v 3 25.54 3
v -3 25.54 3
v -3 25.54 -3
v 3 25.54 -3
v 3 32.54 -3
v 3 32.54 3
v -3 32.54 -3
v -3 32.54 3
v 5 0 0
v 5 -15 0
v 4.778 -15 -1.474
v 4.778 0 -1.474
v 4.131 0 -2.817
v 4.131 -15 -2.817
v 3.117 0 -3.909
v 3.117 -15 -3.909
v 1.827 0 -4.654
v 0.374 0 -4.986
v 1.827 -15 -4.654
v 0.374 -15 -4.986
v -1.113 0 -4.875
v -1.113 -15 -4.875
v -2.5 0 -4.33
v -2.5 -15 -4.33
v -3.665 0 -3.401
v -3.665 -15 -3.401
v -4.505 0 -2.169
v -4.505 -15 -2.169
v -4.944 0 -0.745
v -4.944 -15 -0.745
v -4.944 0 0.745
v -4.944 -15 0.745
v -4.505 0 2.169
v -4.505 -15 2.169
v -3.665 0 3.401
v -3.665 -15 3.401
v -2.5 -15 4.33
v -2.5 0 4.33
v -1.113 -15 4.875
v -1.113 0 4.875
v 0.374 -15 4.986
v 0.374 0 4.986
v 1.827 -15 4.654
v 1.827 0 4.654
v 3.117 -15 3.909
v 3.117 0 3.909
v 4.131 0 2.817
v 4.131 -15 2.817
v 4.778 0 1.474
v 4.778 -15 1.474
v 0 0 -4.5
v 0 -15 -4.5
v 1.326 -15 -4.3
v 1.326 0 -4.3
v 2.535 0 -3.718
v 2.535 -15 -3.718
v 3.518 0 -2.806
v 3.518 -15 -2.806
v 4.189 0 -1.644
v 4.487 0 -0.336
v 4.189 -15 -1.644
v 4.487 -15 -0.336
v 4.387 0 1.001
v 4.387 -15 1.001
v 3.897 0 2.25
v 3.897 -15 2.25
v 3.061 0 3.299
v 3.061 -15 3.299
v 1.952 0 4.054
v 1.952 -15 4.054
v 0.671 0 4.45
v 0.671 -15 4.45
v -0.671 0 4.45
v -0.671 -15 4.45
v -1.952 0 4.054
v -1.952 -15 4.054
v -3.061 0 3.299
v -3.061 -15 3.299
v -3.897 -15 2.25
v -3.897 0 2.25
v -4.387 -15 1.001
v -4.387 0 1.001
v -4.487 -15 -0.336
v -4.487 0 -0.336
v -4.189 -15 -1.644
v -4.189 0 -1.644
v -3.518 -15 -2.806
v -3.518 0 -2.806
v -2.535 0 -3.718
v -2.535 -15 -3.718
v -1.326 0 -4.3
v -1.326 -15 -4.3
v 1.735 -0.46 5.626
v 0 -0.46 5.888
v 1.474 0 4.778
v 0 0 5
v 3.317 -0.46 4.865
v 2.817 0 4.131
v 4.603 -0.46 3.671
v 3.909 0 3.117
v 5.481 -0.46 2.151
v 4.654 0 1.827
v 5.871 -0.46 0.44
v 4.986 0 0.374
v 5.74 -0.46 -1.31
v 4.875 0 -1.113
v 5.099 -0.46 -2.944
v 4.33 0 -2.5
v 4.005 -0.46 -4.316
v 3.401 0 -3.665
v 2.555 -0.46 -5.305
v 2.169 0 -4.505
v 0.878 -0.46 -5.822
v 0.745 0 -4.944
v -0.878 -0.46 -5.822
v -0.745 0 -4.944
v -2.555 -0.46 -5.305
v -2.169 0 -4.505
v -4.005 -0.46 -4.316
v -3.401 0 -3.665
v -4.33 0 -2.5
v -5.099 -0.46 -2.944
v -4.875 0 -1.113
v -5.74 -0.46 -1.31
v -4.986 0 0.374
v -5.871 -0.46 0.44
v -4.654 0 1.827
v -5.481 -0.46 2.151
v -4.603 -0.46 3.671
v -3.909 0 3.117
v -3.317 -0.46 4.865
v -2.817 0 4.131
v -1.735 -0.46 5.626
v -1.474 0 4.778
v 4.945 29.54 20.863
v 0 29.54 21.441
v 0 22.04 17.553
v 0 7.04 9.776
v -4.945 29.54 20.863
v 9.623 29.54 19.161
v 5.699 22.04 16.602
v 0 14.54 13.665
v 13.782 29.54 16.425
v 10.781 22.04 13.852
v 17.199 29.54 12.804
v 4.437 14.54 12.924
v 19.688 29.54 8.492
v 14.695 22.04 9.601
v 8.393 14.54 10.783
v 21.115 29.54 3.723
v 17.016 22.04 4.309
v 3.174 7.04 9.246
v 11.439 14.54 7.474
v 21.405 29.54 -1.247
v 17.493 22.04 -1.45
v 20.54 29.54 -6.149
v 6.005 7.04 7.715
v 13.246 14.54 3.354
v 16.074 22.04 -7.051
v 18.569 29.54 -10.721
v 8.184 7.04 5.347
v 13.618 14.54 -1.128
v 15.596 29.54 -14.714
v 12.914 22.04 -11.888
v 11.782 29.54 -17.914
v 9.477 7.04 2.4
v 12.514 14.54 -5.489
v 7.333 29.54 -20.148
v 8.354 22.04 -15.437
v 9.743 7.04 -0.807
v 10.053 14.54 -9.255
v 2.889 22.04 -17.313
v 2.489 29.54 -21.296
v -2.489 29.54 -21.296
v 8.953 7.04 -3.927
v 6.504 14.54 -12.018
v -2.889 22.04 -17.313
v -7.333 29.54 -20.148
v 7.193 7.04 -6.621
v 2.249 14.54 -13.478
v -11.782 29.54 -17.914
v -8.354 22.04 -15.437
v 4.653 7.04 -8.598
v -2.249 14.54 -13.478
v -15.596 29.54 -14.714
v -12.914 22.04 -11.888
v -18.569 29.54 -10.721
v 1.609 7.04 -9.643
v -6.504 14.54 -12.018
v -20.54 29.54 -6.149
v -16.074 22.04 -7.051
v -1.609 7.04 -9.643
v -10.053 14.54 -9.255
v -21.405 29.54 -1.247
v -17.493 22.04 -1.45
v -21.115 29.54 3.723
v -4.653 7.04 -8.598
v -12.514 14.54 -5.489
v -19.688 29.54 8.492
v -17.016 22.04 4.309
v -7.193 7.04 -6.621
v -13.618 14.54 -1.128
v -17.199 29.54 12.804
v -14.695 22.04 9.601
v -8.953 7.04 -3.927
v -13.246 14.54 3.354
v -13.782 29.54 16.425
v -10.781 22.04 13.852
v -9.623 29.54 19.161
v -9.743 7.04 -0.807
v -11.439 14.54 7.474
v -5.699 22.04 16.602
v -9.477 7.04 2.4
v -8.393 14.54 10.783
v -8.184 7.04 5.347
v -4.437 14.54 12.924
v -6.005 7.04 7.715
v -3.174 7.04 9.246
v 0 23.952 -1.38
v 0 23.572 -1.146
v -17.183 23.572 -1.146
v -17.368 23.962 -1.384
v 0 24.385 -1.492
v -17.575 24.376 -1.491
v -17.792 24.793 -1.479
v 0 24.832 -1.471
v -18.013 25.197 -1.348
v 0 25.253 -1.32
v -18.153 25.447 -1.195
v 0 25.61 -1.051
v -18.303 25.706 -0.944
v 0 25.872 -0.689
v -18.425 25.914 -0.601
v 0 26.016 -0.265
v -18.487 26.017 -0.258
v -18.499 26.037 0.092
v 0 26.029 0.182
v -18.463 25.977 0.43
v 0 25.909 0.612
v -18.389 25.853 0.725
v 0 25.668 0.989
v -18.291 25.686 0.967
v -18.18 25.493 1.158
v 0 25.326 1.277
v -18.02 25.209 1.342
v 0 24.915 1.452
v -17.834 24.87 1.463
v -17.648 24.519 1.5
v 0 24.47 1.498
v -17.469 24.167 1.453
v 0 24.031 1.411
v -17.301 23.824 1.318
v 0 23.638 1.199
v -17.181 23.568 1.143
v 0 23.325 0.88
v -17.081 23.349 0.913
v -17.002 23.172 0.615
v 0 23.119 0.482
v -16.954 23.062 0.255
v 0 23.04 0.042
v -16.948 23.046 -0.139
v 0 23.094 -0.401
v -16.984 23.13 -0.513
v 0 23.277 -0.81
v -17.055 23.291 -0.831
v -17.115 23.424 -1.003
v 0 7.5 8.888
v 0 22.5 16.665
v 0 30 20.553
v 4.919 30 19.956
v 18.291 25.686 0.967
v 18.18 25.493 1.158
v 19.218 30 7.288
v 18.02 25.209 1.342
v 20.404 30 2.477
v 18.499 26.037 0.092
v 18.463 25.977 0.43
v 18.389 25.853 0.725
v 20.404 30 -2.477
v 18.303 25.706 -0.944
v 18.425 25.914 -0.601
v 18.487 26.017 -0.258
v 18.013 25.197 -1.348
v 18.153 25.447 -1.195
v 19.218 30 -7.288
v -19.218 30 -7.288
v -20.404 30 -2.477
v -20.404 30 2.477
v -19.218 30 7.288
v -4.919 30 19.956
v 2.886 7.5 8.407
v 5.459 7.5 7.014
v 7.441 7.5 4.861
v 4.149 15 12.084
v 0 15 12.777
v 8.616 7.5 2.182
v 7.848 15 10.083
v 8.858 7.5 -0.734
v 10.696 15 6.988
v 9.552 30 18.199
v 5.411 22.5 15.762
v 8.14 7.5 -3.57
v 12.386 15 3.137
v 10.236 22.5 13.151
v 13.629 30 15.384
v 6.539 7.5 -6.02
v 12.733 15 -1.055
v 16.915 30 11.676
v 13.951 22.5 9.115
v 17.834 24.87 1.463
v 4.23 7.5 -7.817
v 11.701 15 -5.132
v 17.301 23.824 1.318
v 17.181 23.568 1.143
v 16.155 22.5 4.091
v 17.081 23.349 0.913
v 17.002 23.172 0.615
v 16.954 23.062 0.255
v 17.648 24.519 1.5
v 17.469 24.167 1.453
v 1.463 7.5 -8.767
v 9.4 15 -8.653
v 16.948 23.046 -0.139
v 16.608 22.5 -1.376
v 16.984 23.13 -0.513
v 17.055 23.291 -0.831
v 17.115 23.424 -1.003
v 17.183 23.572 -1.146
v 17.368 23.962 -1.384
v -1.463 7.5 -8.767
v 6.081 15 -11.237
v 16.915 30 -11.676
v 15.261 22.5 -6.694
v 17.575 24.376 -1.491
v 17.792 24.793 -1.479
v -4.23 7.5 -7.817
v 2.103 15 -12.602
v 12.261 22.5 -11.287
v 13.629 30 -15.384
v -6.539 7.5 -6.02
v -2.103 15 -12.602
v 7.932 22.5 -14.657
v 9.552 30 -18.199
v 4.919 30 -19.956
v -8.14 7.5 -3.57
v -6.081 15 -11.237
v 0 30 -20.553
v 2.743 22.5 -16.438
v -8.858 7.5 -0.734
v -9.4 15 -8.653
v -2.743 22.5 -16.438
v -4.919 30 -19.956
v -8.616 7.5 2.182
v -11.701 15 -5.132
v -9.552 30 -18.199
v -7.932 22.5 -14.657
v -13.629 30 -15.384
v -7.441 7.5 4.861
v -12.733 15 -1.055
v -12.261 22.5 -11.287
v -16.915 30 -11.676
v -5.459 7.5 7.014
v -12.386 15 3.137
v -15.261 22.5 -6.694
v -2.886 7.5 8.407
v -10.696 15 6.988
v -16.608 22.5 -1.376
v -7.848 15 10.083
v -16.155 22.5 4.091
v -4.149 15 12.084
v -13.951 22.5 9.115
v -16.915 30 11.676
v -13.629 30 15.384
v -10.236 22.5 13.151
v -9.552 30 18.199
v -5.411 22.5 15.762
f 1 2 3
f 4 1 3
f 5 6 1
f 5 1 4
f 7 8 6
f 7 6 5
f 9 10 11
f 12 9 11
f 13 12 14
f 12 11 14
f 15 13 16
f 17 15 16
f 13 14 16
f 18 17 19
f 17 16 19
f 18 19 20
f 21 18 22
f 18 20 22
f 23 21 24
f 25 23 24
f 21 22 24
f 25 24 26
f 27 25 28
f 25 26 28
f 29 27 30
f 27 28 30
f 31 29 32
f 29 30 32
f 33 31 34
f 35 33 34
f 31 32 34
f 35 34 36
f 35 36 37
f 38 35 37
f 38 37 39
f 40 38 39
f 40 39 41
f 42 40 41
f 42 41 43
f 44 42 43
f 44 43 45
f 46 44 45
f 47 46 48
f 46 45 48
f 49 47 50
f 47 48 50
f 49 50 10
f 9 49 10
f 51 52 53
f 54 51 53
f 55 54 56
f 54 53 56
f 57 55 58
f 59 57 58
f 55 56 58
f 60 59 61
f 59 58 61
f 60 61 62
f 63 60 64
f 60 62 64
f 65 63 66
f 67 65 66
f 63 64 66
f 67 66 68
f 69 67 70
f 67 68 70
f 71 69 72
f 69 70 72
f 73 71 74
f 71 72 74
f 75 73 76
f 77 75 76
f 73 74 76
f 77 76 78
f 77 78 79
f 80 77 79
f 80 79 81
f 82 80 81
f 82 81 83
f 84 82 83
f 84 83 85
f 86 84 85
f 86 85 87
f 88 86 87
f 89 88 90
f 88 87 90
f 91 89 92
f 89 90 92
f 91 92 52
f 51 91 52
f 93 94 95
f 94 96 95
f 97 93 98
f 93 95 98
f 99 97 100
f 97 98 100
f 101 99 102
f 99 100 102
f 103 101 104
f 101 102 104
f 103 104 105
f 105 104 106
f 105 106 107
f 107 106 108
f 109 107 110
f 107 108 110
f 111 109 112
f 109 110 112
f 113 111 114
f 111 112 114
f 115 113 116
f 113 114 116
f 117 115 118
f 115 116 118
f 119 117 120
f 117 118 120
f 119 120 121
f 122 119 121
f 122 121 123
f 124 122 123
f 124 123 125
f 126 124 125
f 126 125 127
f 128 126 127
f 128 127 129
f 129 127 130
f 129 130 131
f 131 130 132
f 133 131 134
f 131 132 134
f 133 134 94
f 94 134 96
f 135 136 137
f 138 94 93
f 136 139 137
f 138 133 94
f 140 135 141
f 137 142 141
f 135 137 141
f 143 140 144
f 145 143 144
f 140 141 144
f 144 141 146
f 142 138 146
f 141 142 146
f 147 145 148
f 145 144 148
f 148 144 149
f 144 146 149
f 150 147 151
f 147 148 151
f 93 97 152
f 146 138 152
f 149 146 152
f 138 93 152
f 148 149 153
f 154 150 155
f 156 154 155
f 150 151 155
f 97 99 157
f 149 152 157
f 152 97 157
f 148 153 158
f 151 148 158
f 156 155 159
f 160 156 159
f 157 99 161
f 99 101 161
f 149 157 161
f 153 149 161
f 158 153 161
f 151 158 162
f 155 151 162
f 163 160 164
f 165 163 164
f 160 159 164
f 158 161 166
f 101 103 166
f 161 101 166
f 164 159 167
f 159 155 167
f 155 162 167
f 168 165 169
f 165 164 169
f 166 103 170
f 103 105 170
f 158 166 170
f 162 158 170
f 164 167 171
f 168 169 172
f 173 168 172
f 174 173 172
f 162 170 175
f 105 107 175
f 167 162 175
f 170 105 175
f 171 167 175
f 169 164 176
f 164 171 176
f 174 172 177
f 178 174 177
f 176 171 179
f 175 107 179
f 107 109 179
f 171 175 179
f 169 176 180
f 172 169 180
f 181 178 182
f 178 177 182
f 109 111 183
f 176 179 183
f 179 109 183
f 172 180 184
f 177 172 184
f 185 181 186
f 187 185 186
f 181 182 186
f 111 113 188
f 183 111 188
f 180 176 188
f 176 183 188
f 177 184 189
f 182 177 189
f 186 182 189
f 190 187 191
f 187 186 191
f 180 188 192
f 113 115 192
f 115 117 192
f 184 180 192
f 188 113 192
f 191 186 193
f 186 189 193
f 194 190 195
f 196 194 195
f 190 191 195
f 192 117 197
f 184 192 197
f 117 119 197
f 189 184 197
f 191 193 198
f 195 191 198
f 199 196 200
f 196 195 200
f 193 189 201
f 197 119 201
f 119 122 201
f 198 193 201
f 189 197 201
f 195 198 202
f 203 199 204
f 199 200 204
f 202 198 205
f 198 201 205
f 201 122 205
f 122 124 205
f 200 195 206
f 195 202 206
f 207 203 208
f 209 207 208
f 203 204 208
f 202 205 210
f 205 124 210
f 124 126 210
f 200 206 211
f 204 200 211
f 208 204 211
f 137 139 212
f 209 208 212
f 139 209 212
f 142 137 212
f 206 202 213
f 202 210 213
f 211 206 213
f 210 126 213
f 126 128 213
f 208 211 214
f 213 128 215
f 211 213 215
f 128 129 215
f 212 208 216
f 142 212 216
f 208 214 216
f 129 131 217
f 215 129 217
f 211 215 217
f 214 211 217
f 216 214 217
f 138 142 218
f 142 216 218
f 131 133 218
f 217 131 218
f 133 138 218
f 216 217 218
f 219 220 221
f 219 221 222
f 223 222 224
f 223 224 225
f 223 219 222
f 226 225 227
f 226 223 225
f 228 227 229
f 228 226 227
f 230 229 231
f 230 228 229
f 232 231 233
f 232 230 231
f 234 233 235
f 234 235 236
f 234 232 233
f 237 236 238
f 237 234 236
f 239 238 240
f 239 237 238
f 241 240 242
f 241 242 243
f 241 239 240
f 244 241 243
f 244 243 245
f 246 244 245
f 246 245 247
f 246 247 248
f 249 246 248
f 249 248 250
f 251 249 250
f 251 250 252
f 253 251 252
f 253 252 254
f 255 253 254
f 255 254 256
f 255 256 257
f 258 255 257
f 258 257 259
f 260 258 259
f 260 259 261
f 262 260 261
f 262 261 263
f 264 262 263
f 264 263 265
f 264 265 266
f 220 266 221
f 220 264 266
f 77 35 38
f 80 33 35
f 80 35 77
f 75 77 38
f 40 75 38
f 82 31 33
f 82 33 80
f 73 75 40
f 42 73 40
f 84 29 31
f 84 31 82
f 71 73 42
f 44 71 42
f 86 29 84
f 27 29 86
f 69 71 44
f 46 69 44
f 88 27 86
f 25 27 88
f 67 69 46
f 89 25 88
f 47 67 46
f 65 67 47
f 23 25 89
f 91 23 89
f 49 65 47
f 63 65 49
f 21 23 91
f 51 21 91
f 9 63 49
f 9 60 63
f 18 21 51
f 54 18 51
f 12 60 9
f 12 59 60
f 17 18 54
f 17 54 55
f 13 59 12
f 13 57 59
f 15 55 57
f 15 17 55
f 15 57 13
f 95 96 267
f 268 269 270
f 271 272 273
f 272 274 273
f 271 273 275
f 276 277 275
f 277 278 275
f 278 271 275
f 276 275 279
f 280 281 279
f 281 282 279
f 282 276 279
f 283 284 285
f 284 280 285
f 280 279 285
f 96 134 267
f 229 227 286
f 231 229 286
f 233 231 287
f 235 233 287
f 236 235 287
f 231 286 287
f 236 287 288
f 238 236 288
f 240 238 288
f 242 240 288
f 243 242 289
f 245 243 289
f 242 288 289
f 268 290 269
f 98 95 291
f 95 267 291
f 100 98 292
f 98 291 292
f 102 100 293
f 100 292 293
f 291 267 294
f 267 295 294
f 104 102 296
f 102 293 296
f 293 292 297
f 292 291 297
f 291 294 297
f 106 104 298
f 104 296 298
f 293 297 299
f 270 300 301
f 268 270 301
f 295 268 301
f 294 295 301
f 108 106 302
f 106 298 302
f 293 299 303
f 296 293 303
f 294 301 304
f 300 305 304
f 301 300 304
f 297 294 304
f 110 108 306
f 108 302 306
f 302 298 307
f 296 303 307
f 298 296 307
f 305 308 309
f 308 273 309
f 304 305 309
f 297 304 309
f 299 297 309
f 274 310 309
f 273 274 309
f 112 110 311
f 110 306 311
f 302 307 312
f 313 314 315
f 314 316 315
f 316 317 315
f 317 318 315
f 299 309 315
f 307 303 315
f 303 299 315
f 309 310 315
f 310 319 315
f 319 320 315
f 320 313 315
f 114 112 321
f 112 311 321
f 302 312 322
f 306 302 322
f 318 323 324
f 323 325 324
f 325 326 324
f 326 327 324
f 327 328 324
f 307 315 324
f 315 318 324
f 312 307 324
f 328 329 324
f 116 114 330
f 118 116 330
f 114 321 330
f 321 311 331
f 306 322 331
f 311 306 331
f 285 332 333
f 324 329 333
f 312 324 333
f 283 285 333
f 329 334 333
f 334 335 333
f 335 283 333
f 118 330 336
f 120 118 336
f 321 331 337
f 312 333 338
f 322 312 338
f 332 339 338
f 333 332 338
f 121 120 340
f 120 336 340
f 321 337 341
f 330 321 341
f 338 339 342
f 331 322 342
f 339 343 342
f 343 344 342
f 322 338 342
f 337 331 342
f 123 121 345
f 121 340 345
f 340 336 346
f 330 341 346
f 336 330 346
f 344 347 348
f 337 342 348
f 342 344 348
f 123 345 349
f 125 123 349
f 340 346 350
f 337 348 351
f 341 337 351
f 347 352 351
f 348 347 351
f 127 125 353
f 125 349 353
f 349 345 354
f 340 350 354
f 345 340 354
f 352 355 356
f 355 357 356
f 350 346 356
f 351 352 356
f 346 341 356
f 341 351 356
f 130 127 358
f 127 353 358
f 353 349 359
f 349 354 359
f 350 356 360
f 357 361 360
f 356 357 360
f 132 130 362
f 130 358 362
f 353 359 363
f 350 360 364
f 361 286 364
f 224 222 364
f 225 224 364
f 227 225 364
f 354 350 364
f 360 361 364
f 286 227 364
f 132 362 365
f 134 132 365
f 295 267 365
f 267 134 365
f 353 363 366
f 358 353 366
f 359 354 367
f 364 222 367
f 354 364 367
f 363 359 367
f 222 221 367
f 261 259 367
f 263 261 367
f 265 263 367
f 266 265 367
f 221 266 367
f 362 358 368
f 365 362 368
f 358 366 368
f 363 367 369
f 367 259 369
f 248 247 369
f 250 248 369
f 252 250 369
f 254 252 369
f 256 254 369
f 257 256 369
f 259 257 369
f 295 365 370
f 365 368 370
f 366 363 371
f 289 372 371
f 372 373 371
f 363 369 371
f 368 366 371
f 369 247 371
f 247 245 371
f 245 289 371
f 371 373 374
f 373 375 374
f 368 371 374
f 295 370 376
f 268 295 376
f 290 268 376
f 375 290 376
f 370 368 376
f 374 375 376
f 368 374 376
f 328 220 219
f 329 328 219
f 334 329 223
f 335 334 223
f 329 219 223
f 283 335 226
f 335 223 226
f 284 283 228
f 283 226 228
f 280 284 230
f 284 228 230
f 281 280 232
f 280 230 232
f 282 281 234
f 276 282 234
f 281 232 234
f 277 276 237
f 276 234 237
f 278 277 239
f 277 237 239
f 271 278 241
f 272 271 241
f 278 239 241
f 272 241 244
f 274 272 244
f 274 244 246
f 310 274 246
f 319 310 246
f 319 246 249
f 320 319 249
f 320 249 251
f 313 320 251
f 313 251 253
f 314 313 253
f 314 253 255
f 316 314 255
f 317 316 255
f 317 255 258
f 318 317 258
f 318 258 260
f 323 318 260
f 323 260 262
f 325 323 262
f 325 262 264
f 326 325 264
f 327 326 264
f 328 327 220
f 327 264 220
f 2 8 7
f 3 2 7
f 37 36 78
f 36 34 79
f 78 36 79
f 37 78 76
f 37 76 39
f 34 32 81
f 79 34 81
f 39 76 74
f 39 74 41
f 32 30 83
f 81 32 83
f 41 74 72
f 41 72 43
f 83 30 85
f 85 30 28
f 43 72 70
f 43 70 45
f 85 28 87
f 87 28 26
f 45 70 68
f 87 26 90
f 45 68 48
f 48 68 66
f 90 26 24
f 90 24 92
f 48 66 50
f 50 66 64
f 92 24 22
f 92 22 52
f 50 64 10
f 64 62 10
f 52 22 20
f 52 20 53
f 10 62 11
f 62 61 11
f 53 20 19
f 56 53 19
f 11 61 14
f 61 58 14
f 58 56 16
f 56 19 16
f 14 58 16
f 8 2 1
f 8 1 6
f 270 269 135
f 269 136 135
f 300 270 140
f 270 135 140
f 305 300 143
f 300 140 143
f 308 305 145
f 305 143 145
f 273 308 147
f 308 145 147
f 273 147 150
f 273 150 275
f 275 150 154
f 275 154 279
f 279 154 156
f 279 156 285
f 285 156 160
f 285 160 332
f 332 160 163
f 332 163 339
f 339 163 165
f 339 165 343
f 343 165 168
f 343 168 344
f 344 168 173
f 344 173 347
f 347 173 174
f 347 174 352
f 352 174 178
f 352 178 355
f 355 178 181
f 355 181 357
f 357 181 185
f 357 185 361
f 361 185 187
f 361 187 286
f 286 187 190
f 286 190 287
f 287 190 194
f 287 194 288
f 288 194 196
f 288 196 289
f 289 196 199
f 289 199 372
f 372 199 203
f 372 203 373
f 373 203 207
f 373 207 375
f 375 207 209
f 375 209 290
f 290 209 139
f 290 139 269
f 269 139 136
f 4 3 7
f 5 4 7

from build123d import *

# Parameters (mm, degrees)
BOSS_EXTRUDE1_REACH             = 44.655
SKETCH2_R                       = 1.5
BOSS_EXTRUDE1_DIRECTION_2_REACH = 44.655
BOSS_EXTRUDE2_DEPTH             = 3
BOSS_EXTRUDE2_DEPTH_BACK        = 3
SKETCH4_W                       = 6
SKETCH4_H                       = 7
BOSS_EXTRUDE3_START             = -15
BOSS_EXTRUDE3_OUTLINE_R         = 5
BOSS_EXTRUDE3_DEPTH             = 15
SKETCH5_R                       = 4.5
CUT_EXTRUDE1_DEPTH              = 15


# Read off the part's stored shape, not the designer's step: Boss-Extrude3
with BuildPart() as part:
    # Sketch1 → Revolve-Thin1 (revolve)
    with BuildSketch(Plane.XY, mode=Mode.PRIVATE) as revolve_thin1_sk:
        Polygon((5, 0), (20.553445617, 30), (21.441225663, 29.539732045), (5.887780046, -0.460267955), align=None)
    revolve(revolve_thin1_sk.sketch.rotate(Axis((0, 0, 0), (0, 1, 0)), 270), axis=Axis((0, 0, 0), (0, 1, 0)))

    # Boss-Extrude1: up to this cone (the profile starts inside it)
    boss_extrude1_end = Plane(origin=(0, 24.539732, 0), z_dir=(0, 1, 0)).offset(-34.183896267) * Cone(1e-06, 50.321346716, 97.061475837, align=(Align.CENTER, Align.CENTER, Align.MIN), mode=Mode.PRIVATE)
    # Sketch2 → Boss-Extrude1 (add, up to the surface)
    with BuildSketch(Plane(origin=(0, 0, 0), x_dir=(0, 0, -1), z_dir=(1, 0, 0)), mode=Mode.PRIVATE) as boss_extrude1_sk1:
        with Locations(Location((0, 24.539732045, 0), (0, 0, 319.809135036))):
            Circle(SKETCH2_R)
    boss_extrude1_tool1 = extrude(boss_extrude1_sk1.sketch, amount=BOSS_EXTRUDE1_REACH, mode=Mode.PRIVATE) & boss_extrude1_end
    add(boss_extrude1_tool1.solids().sort_by_distance((0, 24.539732, 0))[0])

    # Boss-Extrude1 direction 2: up to this cone (the profile starts inside it)
    boss_extrude1_direction_2_end = Plane(origin=(0, 24.539732, 0), z_dir=(0, 1, 0)).offset(-34.183896267) * Cone(1e-06, 50.321346716, 97.061475837, align=(Align.CENTER, Align.CENTER, Align.MIN), mode=Mode.PRIVATE)
    # Sketch2 → Boss-Extrude1 direction 2 (add, up to the surface)
    with BuildSketch(Plane(origin=(0, 0, 0), x_dir=(0, 0, -1), z_dir=(1, 0, 0)), mode=Mode.PRIVATE) as boss_extrude1_direction_2_sk1:
        with Locations(Location((0, 24.539732045, 0), (0, 0, 319.809135036))):
            Circle(SKETCH2_R)
    boss_extrude1_direction_2_tool1 = extrude(boss_extrude1_direction_2_sk1.sketch, amount=-BOSS_EXTRUDE1_DIRECTION_2_REACH, mode=Mode.PRIVATE) & boss_extrude1_direction_2_end
    add(boss_extrude1_direction_2_tool1.solids().sort_by_distance((0, 24.539732, 0))[0])


with BuildPart() as body_2:
    # Sketch4 → Boss-Extrude2 (new, two sides: drawn at the far end of the back side and taken through both)
    with BuildSketch(Plane(origin=(0, 0, 0), x_dir=(0, 0, -1), z_dir=(1, 0, 0)).offset(-BOSS_EXTRUDE2_DEPTH_BACK)):
        with Locations((0, 29.039732045)):
            Rectangle(SKETCH4_W, SKETCH4_H)
    extrude(amount=BOSS_EXTRUDE2_DEPTH + BOSS_EXTRUDE2_DEPTH_BACK)


with BuildPart() as body_3:
    # Boss-Extrude3 outline → Boss-Extrude3 (new body)
    with BuildSketch(Plane(origin=(0, 0, 0), x_dir=(1, 0, 0), z_dir=(0, 1, 0)).offset(BOSS_EXTRUDE3_START)):
        Circle(BOSS_EXTRUDE3_OUTLINE_R)
    extrude(amount=BOSS_EXTRUDE3_DEPTH)

    # Sketch5 → Cut-Extrude1 (cut)
    with BuildSketch(Plane.XZ.offset(15)):
        with Locations(Location((0, 0, 0), (0, 0, 270))):
            Circle(SKETCH5_R)
    extrude(amount=-CUT_EXTRUDE1_DEPTH, mode=Mode.SUBTRACT)


solid = Compound([part.part, body_2.part, body_3.part])
